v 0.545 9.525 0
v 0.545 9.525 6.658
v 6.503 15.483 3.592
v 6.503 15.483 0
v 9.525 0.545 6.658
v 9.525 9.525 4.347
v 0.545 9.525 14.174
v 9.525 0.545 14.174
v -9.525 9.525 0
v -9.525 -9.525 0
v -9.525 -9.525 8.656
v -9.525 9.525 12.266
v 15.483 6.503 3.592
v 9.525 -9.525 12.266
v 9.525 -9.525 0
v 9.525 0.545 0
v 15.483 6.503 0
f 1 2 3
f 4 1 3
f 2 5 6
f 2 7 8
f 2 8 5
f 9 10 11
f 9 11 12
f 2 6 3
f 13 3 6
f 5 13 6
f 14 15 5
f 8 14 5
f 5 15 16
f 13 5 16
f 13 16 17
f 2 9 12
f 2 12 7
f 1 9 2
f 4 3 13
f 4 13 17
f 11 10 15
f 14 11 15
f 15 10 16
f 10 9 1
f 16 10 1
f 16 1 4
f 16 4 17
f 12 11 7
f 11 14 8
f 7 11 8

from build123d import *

# Parameters (mm, degrees)
F0_W     = 19.05
F0_H     = 19.05
F1_DEPTH = 15.875
F4_DEPTH = 18.796
F6_DEPTH = 6.35
F8_DEPTH = 12.7


with BuildPart() as f1:
    # F0 (on Top) → F1 (new body)
    with BuildSketch(Plane.XY):
        Rectangle(F0_W, F0_H)
    extrude(amount=F1_DEPTH)

    # F3 (on face) → F4 (cut, symmetric)
    with BuildSketch(Plane(origin=(0, 0, 0), x_dir=(0.707107, 0.707107, 0), z_dir=(0.707107, -0.707107, 0))):
        Polygon((-20.731339, 6.710676), (13.470384, 15.875), (-26.841145, 15.875), align=None)
    extrude(amount=F4_DEPTH, both=True, mode=Mode.SUBTRACT)

    # F5 (on face) → F6 (join, symmetric)
    with BuildSketch(Plane(origin=(0, 0, 0), x_dir=(0.707107, 0.707107, 0), z_dir=(0.707107, -0.707107, 0))):
        Polygon((5.318243, 0), (13.470384, 0), (25.414204, 0), (5.383082, 7.290732), align=None)
    extrude(amount=F6_DEPTH, both=True)

    # F7 (on face) → F8 (cut, symmetric)
    with BuildSketch(Plane(origin=(0, 0, 0), x_dir=(0.707107, 0.707107, 0), z_dir=(0.707107, -0.707107, 0))):
        Polygon((7.120384, 16.243063), (7.120384, 6.658406), (15.546197, 3.591661), (15.546197, 0), (25.414204, 0), (14.018306, 17.516766), align=None)
    extrude(amount=F8_DEPTH, both=True, mode=Mode.SUBTRACT)


solid = f1.part
